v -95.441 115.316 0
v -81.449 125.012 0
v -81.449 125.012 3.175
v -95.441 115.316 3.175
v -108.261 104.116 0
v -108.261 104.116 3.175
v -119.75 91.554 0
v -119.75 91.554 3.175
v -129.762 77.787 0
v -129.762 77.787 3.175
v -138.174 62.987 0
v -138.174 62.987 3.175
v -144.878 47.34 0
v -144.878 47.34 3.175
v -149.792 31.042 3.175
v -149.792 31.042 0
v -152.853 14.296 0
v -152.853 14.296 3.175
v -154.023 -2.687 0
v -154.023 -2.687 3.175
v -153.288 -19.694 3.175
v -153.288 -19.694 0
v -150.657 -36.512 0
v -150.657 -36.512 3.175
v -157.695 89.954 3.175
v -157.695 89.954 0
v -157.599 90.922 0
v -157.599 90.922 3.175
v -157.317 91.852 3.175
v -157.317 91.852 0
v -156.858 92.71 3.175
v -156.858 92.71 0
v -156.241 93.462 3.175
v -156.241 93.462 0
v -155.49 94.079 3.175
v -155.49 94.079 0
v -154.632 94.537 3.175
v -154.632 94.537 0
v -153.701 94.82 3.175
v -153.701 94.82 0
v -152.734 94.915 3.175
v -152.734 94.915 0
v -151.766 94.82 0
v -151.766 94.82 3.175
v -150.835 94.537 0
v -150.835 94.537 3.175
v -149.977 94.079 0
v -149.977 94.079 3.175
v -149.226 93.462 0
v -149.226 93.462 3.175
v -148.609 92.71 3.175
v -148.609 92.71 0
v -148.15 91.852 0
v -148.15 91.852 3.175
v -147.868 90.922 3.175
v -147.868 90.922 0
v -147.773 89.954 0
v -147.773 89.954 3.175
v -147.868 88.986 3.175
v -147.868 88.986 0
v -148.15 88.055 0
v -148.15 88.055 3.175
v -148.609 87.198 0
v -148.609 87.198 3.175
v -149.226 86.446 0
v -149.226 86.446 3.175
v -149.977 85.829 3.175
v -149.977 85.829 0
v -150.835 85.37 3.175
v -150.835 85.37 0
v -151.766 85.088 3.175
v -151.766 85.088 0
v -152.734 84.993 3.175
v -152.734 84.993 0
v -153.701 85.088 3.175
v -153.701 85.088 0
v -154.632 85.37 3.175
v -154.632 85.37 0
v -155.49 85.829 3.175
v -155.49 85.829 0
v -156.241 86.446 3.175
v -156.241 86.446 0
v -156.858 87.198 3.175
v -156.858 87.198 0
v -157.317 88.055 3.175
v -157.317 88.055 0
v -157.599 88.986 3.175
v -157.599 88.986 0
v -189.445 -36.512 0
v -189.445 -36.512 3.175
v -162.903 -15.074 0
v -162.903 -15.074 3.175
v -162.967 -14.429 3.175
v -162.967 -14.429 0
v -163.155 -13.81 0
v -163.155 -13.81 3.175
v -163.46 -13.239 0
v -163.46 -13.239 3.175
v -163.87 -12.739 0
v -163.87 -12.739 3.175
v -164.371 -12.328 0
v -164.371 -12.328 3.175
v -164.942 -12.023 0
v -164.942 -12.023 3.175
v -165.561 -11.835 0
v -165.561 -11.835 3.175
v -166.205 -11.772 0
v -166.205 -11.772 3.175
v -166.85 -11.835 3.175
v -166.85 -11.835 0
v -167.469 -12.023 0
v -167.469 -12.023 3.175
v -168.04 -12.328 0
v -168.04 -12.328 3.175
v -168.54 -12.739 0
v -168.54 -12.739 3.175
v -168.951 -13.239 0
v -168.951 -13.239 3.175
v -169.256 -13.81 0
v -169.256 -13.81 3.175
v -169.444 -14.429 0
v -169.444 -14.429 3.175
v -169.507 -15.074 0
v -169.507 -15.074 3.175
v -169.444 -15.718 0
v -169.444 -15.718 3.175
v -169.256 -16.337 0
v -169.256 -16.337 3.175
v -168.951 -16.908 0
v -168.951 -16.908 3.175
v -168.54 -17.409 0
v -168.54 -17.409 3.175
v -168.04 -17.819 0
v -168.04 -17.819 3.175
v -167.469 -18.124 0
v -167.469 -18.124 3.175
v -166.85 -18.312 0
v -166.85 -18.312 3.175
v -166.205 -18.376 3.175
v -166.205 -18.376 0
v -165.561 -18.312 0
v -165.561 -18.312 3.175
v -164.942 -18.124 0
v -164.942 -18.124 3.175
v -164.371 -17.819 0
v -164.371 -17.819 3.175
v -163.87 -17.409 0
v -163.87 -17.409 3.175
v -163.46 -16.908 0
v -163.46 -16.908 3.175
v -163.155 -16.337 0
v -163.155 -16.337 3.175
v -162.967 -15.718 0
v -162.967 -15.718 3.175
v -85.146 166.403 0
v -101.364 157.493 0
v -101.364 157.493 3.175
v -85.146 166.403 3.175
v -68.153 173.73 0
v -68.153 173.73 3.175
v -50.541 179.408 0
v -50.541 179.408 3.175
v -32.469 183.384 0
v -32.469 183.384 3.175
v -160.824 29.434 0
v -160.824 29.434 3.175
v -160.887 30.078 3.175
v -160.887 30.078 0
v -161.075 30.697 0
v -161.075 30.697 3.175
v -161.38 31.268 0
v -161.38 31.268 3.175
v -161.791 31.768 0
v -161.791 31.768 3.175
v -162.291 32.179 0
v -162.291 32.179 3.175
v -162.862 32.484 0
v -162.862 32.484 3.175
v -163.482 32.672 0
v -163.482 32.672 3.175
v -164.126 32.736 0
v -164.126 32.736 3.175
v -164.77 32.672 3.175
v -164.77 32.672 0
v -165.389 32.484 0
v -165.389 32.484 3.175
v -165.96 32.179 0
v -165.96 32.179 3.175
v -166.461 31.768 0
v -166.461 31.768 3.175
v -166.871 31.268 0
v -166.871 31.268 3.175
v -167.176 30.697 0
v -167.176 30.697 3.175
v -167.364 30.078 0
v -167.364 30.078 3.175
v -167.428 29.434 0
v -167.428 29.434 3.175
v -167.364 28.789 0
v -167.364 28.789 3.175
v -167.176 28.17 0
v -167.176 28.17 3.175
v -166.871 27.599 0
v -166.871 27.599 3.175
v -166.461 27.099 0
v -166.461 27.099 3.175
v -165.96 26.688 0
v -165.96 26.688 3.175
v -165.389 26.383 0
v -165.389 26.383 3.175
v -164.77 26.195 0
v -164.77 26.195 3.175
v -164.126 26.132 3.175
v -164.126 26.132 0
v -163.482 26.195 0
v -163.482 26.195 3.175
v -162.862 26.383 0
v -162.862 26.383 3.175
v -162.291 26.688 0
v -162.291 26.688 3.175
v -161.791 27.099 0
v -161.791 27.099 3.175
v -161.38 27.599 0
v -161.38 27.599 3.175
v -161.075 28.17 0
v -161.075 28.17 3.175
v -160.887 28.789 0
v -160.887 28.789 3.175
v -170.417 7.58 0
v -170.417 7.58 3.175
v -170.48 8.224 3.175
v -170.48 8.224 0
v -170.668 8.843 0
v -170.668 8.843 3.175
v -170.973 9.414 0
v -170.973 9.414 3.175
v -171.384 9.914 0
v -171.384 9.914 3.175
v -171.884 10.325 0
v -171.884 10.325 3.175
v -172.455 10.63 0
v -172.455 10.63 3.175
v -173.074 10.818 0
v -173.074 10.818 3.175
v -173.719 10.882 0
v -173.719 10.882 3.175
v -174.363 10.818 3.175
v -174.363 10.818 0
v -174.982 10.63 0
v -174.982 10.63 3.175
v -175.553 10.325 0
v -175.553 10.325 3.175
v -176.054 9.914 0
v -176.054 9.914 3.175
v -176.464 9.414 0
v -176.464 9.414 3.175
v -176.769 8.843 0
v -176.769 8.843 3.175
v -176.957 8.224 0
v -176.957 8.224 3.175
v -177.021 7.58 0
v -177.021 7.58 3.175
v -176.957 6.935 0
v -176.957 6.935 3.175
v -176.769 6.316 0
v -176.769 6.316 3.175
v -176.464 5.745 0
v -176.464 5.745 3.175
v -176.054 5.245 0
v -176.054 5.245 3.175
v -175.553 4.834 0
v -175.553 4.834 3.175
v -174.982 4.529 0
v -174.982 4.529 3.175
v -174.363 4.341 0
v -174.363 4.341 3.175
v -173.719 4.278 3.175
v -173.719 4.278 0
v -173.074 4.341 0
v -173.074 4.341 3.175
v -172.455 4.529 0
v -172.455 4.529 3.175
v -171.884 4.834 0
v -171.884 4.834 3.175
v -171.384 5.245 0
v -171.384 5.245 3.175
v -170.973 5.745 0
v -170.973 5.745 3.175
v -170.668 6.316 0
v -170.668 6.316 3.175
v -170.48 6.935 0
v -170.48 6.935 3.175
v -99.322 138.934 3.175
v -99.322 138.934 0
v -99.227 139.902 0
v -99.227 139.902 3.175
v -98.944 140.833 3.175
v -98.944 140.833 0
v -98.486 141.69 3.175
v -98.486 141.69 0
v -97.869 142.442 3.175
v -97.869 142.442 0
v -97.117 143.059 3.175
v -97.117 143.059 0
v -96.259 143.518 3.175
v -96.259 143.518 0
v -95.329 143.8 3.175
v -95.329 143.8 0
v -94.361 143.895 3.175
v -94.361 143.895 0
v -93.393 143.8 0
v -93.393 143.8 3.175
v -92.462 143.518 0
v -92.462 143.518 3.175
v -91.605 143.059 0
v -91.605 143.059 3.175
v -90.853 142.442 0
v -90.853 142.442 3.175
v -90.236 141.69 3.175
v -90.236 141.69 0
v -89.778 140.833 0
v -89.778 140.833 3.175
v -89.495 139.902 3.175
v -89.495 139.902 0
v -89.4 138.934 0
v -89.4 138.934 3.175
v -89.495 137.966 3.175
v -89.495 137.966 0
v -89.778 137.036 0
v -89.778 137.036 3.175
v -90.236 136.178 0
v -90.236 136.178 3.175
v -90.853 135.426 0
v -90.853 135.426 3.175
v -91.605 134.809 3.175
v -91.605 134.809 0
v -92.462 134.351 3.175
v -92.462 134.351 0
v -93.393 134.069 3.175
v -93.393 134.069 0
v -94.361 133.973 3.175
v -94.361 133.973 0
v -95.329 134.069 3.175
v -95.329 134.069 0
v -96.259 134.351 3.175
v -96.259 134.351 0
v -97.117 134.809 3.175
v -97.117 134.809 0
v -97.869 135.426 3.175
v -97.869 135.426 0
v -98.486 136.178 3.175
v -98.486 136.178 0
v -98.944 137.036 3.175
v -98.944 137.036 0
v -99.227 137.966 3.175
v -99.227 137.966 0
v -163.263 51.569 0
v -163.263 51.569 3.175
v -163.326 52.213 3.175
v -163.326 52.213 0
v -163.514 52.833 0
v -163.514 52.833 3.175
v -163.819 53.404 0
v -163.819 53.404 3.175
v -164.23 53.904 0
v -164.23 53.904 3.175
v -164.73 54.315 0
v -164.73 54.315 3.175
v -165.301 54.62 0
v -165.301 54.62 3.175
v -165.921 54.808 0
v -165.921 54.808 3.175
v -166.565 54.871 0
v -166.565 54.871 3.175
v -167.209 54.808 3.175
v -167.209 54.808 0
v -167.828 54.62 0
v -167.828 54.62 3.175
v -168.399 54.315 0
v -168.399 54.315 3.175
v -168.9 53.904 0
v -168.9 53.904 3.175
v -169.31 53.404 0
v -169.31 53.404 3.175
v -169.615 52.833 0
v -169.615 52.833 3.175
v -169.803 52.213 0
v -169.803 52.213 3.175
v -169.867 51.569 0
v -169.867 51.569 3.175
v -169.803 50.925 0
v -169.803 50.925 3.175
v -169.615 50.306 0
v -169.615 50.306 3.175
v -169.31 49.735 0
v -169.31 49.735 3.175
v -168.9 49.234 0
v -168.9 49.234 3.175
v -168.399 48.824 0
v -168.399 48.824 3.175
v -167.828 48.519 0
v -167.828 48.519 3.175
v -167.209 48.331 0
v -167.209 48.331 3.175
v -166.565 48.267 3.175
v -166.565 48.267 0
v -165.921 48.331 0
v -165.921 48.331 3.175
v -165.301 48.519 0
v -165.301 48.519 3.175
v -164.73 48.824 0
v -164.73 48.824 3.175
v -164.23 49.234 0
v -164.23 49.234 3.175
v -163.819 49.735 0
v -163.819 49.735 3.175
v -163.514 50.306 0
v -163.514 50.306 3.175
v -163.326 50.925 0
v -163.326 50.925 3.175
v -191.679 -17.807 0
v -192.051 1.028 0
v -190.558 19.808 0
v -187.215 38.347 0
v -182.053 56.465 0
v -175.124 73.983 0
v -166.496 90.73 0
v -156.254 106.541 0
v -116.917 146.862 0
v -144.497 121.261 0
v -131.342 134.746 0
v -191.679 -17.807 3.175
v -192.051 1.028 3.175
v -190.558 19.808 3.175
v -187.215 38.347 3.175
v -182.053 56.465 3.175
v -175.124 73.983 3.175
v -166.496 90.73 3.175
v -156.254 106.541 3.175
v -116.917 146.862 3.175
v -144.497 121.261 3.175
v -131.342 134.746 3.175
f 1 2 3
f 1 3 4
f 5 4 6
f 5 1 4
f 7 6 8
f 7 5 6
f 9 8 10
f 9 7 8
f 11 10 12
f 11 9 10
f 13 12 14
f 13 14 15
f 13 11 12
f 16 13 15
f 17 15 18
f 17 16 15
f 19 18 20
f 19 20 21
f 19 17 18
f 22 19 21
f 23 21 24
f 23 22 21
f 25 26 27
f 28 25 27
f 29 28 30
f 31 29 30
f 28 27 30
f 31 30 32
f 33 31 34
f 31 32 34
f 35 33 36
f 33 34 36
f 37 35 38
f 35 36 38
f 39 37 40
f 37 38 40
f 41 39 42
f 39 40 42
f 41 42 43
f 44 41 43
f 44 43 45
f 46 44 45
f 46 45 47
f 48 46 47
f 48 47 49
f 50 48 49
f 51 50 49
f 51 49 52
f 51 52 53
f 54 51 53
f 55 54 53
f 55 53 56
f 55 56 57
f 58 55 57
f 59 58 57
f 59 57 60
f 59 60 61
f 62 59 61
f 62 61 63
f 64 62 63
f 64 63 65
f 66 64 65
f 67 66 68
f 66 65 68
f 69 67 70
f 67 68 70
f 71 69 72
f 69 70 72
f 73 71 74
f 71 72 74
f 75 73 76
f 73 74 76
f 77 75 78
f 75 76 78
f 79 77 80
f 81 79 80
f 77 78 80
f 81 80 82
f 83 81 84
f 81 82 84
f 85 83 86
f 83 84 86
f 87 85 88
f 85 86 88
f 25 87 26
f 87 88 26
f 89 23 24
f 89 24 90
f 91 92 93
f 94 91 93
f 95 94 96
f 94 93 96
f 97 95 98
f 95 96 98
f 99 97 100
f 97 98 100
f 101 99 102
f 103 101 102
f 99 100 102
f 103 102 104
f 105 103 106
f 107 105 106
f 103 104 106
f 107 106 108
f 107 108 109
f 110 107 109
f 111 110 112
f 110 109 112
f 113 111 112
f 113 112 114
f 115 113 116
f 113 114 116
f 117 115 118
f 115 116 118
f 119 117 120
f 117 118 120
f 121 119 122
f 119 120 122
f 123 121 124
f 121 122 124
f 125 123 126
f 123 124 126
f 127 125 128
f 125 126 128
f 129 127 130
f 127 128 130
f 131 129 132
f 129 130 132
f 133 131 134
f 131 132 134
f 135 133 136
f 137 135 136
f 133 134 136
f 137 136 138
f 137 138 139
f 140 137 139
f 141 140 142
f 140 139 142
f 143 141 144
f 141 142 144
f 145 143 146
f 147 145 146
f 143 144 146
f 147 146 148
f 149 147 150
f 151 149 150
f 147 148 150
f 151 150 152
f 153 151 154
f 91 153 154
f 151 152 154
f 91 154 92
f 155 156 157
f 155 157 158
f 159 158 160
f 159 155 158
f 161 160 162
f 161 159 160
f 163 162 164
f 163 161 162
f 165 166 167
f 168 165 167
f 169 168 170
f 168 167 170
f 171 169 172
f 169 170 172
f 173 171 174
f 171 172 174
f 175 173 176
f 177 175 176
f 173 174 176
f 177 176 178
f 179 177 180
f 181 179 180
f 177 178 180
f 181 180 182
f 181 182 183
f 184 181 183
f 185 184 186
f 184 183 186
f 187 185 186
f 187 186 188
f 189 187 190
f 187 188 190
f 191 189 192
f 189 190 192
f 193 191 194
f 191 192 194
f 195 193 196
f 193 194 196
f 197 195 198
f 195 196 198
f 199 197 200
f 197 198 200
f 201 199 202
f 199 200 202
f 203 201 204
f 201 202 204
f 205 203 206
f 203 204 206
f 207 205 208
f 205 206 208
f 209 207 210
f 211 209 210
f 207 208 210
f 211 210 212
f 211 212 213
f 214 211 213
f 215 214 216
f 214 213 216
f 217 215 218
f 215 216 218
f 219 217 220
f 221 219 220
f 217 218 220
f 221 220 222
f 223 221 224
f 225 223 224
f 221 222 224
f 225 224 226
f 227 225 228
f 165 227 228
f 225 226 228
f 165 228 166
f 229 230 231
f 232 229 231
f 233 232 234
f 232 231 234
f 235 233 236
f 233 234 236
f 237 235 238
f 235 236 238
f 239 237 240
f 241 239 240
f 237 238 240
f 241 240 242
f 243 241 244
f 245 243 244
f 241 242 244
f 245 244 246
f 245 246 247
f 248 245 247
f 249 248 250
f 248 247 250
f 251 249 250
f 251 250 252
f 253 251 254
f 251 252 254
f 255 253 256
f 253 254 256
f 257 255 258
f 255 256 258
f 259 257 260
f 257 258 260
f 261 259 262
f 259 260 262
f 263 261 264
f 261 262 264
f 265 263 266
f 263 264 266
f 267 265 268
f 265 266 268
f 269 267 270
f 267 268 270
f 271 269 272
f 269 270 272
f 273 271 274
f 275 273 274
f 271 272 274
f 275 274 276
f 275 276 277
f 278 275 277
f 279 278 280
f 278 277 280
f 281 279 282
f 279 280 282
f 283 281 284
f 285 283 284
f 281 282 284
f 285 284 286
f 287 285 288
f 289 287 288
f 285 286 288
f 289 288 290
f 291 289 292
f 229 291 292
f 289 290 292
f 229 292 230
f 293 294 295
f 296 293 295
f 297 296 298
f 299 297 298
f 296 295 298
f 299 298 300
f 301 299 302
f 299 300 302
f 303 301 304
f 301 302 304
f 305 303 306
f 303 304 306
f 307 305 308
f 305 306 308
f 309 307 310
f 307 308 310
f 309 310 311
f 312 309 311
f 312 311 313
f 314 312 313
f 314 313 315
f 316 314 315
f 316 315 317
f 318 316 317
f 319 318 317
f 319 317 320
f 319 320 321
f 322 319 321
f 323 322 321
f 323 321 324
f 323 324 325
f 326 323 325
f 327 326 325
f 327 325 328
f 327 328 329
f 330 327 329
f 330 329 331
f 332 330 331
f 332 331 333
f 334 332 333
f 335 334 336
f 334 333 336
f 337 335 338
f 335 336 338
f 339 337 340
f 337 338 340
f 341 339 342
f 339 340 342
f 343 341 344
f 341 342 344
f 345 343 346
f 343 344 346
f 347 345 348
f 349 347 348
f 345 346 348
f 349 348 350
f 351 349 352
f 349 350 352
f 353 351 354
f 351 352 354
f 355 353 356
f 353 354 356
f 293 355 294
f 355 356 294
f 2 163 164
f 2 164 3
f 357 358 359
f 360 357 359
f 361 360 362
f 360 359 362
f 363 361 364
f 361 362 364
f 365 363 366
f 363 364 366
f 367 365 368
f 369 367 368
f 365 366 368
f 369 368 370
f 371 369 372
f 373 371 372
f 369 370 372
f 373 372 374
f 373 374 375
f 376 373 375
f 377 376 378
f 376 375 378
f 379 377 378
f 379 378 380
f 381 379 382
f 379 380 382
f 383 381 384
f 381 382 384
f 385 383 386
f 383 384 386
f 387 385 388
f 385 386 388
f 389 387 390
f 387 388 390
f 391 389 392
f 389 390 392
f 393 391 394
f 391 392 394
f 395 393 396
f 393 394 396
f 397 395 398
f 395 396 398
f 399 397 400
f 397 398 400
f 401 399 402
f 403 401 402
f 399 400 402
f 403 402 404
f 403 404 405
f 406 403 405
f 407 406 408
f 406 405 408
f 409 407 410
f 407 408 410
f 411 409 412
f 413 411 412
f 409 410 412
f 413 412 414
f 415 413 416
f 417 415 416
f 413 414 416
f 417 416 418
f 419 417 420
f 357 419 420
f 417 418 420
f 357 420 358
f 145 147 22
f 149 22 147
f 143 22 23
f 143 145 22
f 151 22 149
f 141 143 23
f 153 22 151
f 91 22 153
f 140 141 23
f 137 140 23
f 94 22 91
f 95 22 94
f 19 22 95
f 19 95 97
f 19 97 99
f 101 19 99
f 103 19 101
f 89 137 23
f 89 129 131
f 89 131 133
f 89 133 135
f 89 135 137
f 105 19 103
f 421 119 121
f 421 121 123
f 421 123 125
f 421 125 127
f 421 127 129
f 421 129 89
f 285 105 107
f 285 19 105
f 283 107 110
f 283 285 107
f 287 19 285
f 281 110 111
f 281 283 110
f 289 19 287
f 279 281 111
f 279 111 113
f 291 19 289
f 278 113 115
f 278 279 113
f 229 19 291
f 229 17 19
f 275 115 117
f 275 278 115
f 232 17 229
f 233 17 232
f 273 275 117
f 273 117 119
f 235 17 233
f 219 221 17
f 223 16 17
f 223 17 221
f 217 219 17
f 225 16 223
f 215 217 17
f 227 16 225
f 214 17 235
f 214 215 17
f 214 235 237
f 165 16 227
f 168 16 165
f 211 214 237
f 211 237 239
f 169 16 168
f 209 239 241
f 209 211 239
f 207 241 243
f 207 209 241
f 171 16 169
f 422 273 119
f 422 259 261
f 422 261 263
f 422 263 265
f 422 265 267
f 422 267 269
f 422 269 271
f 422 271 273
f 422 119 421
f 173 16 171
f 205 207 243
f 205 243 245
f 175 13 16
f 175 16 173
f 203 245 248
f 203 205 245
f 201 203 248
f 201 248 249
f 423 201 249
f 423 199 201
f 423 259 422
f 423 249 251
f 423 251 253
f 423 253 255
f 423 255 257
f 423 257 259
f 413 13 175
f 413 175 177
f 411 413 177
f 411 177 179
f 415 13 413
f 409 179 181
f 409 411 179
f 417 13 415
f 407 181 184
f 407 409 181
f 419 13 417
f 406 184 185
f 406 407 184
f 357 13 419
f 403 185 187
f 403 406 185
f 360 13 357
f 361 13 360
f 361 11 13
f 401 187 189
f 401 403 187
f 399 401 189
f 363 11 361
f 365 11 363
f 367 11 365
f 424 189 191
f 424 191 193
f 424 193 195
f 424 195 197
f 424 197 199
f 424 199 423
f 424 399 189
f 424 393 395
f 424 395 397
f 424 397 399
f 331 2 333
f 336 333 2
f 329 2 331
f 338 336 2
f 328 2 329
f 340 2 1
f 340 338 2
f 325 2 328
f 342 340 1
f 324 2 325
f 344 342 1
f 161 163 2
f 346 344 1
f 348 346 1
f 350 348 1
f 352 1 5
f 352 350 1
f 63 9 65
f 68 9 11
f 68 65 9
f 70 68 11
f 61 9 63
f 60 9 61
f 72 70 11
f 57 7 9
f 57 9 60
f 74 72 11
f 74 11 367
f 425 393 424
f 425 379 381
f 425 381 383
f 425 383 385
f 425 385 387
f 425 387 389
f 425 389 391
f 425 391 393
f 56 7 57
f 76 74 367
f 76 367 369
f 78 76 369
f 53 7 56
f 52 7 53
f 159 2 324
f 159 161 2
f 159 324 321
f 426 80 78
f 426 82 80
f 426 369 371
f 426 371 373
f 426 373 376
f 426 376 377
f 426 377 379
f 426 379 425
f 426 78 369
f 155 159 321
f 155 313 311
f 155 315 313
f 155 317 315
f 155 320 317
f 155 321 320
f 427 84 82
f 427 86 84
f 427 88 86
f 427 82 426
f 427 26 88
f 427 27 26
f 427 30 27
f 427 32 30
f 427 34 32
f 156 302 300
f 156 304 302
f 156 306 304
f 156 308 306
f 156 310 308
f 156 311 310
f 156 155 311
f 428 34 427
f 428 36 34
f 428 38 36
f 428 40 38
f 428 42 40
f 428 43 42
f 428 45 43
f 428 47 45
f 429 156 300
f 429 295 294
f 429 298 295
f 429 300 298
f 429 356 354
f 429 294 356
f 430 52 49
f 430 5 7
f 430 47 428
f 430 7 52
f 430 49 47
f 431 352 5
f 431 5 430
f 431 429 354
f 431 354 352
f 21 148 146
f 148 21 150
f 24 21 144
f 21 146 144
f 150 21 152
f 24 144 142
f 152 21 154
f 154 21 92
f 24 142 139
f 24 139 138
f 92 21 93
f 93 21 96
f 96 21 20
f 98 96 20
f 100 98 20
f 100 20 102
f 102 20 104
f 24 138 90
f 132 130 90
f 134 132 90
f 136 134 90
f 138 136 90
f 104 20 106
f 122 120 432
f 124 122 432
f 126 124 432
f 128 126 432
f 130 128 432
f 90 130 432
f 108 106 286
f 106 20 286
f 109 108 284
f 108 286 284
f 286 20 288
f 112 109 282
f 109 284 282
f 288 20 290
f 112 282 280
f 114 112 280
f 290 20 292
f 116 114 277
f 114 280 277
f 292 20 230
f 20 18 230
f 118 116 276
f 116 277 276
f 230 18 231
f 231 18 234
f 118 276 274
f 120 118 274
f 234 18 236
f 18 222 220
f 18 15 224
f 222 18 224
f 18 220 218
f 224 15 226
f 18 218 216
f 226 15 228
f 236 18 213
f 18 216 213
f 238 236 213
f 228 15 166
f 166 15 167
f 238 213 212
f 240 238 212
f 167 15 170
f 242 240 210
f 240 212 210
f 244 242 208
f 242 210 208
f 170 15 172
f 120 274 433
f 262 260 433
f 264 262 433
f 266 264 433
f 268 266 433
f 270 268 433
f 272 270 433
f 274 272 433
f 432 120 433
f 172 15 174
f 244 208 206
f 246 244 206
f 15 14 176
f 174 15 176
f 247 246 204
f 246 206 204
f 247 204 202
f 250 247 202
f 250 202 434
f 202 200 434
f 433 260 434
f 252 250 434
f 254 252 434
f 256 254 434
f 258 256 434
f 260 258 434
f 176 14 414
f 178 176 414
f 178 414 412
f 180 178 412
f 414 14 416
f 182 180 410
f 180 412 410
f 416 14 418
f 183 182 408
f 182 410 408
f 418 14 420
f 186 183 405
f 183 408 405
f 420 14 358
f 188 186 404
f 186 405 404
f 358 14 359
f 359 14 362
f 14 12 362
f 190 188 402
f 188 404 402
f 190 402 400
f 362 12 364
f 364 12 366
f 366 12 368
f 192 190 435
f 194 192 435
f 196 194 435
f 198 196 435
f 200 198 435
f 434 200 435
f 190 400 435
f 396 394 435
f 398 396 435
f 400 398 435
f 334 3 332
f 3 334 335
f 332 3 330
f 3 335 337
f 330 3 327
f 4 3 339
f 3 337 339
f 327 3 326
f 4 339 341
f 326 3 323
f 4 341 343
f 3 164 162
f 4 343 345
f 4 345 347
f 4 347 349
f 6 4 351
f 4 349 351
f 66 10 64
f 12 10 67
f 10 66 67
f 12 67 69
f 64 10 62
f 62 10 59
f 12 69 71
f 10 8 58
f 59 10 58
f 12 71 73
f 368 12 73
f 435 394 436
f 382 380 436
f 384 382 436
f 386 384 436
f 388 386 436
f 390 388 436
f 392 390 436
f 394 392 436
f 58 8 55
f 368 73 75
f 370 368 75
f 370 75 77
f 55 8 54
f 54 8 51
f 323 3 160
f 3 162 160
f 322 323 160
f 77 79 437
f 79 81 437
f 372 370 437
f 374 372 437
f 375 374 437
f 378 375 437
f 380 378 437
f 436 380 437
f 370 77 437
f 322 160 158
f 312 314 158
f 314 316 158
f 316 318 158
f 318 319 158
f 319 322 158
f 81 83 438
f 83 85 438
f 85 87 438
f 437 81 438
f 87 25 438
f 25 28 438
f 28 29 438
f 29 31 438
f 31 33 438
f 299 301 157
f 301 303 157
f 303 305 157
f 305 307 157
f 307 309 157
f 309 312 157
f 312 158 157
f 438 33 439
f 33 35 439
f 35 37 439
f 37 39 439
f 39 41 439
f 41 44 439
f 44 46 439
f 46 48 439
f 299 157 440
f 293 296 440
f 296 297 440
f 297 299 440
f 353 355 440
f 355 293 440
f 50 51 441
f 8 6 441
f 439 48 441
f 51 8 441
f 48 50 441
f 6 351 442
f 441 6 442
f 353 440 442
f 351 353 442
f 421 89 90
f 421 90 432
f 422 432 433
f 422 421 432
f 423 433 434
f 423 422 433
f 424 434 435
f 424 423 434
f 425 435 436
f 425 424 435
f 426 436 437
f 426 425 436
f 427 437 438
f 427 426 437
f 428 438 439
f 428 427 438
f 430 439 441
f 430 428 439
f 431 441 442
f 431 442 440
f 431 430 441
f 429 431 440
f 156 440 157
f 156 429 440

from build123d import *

# Parameters (mm, degrees)
BOSS_EXTRUDE1_DEPTH              = 3.175
SKETCH2_R                        = 3.302
CUT_EXTRUDE1_DEPTH               = 3.175
SKETCH3_R                        = 3.302
CUT_EXTRUDE2_DEPTH               = 3.175
F_25_64_0_39063_DIAMETER_HOLE1_D = 9.922002


with BuildPart() as part:
    # Sketch1 → Boss-Extrude1 (new body)
    with BuildSketch(Plane.XY):
        with BuildLine():
            Line((-150.65739054, -36.5125), (-189.445196846, -36.5125))
            ThreePointArc((-189.445196846, -36.5125), (-175.12424315, 73.983329), (-101.363819659, 157.492716901))
            ThreePointArc((-101.363819659, 157.492716901), (-68.153294369, 173.730017516), (-32.46878203, 183.38426531))
            Line((-32.46878203, 183.38426531), (-81.449197888, 125.011678745))
            ThreePointArc((-81.449197888, 125.011678745), (-141.744884659, 55.257653644), (-150.65739054, -36.5125))
        make_face()
    extrude(amount=BOSS_EXTRUDE1_DEPTH)

    # Sketch2 → Cut-Extrude1 (cut)
    with BuildSketch(Plane.XY.offset(3.175)):
        with Locations((-166.205357894, -15.073647178)):
            Circle(SKETCH2_R)
        with Locations((-164.125827505, 29.433503815)):
            Circle(SKETCH2_R)
    extrude(amount=-CUT_EXTRUDE1_DEPTH, mode=Mode.SUBTRACT)

    # Sketch3 → Cut-Extrude2 (cut)
    with BuildSketch(Plane.XY.offset(3.175)):
        with Locations((-173.718655592, 7.579557452)):
            Circle(SKETCH3_R)
        with Locations((-166.564839951, 51.569288407)):
            Circle(SKETCH3_R)
    extrude(amount=-CUT_EXTRUDE2_DEPTH, mode=Mode.SUBTRACT)

    # 25/64 (0.39063) Diameter Hole1 (through all)
    with Locations(Plane.XY.offset(3.175)):
        with Locations((-94.36092612, 138.93426531), (-152.733512685, 89.953849452)):
            Hole(F_25_64_0_39063_DIAMETER_HOLE1_D / 2)


solid = part.part
